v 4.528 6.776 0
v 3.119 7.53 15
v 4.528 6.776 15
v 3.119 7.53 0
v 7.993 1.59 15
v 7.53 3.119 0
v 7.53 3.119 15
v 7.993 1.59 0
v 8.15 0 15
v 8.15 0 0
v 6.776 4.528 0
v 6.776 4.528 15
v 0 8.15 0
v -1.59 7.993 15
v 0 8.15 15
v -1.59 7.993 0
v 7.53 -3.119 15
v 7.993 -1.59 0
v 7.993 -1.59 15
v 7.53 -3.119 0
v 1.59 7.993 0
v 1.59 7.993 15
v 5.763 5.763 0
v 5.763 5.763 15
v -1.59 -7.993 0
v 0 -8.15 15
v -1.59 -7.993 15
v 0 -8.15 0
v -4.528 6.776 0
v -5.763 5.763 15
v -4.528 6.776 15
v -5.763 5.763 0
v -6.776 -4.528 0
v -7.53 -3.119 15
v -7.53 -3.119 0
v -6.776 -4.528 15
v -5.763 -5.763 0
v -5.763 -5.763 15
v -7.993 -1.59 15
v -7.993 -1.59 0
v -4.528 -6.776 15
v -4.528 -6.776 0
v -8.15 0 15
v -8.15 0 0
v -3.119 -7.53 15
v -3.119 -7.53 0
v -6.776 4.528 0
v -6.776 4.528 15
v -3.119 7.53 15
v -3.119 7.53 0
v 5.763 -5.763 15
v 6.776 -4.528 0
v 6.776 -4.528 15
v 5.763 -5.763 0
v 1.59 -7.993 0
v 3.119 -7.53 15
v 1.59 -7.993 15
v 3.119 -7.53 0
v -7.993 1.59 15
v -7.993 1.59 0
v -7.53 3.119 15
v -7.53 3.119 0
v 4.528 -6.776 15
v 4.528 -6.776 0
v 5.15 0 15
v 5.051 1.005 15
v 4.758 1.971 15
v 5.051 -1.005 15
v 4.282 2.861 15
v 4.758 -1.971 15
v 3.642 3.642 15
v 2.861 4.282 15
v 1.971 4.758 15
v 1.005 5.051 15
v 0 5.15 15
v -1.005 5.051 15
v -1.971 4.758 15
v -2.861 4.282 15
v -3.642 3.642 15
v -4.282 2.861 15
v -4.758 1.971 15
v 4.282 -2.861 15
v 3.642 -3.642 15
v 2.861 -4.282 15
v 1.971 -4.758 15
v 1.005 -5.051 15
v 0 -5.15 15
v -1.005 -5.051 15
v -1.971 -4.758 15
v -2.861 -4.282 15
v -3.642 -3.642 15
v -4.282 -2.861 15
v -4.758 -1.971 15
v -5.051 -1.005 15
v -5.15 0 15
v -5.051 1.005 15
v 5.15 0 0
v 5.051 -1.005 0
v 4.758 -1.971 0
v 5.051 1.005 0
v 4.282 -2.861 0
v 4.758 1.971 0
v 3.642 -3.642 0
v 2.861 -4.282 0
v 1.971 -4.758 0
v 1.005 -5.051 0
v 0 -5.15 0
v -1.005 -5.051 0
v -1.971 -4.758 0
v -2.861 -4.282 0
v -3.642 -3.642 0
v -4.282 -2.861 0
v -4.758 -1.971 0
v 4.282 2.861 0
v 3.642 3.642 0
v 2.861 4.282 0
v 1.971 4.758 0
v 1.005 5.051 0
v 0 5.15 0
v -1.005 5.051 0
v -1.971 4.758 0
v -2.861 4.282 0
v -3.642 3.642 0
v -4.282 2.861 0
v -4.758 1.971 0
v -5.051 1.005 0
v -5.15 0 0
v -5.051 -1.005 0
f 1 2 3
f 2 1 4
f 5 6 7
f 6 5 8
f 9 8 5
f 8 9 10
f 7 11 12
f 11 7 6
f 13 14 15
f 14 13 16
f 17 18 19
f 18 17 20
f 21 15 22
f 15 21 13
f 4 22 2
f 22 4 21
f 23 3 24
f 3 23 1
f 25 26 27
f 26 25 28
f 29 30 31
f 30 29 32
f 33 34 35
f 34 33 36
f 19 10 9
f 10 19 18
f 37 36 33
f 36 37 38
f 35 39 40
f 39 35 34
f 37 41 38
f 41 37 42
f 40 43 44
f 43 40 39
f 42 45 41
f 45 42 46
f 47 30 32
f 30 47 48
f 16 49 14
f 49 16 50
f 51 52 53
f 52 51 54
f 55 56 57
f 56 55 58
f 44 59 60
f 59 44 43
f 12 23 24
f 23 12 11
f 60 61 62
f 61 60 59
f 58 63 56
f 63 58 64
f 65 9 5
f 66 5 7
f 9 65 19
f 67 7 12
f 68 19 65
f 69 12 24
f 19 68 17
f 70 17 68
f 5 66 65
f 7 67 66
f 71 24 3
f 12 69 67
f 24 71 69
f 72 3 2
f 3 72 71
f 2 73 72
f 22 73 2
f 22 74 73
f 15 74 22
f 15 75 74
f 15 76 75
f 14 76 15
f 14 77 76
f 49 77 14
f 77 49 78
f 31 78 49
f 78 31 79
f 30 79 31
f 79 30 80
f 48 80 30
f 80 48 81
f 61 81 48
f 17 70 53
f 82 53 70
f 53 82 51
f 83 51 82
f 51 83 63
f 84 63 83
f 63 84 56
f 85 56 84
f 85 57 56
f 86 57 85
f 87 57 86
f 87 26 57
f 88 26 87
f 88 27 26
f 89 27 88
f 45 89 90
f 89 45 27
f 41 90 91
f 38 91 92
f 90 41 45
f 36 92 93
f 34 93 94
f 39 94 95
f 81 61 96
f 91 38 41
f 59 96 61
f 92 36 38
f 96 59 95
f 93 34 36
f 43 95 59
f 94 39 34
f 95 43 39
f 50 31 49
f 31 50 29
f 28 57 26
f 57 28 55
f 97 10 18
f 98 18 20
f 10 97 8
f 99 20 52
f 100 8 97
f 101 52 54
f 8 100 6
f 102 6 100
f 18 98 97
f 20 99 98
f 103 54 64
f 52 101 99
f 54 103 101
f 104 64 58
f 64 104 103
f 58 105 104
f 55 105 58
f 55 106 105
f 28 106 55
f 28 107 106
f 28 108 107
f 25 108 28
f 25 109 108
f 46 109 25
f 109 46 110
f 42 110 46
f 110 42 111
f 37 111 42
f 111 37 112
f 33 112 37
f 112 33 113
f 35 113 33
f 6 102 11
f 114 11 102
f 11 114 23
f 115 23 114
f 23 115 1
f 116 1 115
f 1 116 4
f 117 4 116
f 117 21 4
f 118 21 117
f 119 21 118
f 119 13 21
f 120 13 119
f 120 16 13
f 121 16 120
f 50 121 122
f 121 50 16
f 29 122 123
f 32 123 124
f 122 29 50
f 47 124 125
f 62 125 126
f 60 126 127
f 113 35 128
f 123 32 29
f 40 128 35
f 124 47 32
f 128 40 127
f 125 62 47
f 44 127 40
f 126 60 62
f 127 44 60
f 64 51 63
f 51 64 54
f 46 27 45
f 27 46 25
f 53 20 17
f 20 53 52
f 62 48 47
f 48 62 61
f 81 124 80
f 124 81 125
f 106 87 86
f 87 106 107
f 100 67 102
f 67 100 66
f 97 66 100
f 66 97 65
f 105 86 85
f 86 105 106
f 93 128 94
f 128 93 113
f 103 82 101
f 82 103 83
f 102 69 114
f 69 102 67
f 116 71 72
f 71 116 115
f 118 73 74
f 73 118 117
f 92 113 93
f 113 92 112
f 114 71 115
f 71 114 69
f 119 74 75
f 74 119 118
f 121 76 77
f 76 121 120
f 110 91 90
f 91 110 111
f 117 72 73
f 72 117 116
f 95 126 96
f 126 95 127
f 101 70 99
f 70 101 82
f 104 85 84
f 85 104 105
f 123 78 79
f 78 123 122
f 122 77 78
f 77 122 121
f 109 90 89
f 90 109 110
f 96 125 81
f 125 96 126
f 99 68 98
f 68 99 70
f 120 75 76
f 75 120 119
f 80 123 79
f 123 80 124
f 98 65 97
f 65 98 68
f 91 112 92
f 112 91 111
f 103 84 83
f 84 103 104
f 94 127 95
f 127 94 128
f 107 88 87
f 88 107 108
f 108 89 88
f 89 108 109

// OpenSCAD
$fn = 32;

// ----------------------------------------------------------------------
// Spacer sleeve: 16.3 / 10.3 x 15 mm
// ----------------------------------------------------------------------

// --- parameters (mm) ---
sleeve_od = 16.3;         // outside diameter
sleeve_id = 10.3;         // shaft bore
sleeve_l = 15;            // sleeve length

module sleeve() {
  cylinder(h = sleeve_l, d = sleeve_od);
}

difference() {
  sleeve();
  translate([0, 0, -1]) cylinder(h = sleeve_l + 2, d = sleeve_id);
}
